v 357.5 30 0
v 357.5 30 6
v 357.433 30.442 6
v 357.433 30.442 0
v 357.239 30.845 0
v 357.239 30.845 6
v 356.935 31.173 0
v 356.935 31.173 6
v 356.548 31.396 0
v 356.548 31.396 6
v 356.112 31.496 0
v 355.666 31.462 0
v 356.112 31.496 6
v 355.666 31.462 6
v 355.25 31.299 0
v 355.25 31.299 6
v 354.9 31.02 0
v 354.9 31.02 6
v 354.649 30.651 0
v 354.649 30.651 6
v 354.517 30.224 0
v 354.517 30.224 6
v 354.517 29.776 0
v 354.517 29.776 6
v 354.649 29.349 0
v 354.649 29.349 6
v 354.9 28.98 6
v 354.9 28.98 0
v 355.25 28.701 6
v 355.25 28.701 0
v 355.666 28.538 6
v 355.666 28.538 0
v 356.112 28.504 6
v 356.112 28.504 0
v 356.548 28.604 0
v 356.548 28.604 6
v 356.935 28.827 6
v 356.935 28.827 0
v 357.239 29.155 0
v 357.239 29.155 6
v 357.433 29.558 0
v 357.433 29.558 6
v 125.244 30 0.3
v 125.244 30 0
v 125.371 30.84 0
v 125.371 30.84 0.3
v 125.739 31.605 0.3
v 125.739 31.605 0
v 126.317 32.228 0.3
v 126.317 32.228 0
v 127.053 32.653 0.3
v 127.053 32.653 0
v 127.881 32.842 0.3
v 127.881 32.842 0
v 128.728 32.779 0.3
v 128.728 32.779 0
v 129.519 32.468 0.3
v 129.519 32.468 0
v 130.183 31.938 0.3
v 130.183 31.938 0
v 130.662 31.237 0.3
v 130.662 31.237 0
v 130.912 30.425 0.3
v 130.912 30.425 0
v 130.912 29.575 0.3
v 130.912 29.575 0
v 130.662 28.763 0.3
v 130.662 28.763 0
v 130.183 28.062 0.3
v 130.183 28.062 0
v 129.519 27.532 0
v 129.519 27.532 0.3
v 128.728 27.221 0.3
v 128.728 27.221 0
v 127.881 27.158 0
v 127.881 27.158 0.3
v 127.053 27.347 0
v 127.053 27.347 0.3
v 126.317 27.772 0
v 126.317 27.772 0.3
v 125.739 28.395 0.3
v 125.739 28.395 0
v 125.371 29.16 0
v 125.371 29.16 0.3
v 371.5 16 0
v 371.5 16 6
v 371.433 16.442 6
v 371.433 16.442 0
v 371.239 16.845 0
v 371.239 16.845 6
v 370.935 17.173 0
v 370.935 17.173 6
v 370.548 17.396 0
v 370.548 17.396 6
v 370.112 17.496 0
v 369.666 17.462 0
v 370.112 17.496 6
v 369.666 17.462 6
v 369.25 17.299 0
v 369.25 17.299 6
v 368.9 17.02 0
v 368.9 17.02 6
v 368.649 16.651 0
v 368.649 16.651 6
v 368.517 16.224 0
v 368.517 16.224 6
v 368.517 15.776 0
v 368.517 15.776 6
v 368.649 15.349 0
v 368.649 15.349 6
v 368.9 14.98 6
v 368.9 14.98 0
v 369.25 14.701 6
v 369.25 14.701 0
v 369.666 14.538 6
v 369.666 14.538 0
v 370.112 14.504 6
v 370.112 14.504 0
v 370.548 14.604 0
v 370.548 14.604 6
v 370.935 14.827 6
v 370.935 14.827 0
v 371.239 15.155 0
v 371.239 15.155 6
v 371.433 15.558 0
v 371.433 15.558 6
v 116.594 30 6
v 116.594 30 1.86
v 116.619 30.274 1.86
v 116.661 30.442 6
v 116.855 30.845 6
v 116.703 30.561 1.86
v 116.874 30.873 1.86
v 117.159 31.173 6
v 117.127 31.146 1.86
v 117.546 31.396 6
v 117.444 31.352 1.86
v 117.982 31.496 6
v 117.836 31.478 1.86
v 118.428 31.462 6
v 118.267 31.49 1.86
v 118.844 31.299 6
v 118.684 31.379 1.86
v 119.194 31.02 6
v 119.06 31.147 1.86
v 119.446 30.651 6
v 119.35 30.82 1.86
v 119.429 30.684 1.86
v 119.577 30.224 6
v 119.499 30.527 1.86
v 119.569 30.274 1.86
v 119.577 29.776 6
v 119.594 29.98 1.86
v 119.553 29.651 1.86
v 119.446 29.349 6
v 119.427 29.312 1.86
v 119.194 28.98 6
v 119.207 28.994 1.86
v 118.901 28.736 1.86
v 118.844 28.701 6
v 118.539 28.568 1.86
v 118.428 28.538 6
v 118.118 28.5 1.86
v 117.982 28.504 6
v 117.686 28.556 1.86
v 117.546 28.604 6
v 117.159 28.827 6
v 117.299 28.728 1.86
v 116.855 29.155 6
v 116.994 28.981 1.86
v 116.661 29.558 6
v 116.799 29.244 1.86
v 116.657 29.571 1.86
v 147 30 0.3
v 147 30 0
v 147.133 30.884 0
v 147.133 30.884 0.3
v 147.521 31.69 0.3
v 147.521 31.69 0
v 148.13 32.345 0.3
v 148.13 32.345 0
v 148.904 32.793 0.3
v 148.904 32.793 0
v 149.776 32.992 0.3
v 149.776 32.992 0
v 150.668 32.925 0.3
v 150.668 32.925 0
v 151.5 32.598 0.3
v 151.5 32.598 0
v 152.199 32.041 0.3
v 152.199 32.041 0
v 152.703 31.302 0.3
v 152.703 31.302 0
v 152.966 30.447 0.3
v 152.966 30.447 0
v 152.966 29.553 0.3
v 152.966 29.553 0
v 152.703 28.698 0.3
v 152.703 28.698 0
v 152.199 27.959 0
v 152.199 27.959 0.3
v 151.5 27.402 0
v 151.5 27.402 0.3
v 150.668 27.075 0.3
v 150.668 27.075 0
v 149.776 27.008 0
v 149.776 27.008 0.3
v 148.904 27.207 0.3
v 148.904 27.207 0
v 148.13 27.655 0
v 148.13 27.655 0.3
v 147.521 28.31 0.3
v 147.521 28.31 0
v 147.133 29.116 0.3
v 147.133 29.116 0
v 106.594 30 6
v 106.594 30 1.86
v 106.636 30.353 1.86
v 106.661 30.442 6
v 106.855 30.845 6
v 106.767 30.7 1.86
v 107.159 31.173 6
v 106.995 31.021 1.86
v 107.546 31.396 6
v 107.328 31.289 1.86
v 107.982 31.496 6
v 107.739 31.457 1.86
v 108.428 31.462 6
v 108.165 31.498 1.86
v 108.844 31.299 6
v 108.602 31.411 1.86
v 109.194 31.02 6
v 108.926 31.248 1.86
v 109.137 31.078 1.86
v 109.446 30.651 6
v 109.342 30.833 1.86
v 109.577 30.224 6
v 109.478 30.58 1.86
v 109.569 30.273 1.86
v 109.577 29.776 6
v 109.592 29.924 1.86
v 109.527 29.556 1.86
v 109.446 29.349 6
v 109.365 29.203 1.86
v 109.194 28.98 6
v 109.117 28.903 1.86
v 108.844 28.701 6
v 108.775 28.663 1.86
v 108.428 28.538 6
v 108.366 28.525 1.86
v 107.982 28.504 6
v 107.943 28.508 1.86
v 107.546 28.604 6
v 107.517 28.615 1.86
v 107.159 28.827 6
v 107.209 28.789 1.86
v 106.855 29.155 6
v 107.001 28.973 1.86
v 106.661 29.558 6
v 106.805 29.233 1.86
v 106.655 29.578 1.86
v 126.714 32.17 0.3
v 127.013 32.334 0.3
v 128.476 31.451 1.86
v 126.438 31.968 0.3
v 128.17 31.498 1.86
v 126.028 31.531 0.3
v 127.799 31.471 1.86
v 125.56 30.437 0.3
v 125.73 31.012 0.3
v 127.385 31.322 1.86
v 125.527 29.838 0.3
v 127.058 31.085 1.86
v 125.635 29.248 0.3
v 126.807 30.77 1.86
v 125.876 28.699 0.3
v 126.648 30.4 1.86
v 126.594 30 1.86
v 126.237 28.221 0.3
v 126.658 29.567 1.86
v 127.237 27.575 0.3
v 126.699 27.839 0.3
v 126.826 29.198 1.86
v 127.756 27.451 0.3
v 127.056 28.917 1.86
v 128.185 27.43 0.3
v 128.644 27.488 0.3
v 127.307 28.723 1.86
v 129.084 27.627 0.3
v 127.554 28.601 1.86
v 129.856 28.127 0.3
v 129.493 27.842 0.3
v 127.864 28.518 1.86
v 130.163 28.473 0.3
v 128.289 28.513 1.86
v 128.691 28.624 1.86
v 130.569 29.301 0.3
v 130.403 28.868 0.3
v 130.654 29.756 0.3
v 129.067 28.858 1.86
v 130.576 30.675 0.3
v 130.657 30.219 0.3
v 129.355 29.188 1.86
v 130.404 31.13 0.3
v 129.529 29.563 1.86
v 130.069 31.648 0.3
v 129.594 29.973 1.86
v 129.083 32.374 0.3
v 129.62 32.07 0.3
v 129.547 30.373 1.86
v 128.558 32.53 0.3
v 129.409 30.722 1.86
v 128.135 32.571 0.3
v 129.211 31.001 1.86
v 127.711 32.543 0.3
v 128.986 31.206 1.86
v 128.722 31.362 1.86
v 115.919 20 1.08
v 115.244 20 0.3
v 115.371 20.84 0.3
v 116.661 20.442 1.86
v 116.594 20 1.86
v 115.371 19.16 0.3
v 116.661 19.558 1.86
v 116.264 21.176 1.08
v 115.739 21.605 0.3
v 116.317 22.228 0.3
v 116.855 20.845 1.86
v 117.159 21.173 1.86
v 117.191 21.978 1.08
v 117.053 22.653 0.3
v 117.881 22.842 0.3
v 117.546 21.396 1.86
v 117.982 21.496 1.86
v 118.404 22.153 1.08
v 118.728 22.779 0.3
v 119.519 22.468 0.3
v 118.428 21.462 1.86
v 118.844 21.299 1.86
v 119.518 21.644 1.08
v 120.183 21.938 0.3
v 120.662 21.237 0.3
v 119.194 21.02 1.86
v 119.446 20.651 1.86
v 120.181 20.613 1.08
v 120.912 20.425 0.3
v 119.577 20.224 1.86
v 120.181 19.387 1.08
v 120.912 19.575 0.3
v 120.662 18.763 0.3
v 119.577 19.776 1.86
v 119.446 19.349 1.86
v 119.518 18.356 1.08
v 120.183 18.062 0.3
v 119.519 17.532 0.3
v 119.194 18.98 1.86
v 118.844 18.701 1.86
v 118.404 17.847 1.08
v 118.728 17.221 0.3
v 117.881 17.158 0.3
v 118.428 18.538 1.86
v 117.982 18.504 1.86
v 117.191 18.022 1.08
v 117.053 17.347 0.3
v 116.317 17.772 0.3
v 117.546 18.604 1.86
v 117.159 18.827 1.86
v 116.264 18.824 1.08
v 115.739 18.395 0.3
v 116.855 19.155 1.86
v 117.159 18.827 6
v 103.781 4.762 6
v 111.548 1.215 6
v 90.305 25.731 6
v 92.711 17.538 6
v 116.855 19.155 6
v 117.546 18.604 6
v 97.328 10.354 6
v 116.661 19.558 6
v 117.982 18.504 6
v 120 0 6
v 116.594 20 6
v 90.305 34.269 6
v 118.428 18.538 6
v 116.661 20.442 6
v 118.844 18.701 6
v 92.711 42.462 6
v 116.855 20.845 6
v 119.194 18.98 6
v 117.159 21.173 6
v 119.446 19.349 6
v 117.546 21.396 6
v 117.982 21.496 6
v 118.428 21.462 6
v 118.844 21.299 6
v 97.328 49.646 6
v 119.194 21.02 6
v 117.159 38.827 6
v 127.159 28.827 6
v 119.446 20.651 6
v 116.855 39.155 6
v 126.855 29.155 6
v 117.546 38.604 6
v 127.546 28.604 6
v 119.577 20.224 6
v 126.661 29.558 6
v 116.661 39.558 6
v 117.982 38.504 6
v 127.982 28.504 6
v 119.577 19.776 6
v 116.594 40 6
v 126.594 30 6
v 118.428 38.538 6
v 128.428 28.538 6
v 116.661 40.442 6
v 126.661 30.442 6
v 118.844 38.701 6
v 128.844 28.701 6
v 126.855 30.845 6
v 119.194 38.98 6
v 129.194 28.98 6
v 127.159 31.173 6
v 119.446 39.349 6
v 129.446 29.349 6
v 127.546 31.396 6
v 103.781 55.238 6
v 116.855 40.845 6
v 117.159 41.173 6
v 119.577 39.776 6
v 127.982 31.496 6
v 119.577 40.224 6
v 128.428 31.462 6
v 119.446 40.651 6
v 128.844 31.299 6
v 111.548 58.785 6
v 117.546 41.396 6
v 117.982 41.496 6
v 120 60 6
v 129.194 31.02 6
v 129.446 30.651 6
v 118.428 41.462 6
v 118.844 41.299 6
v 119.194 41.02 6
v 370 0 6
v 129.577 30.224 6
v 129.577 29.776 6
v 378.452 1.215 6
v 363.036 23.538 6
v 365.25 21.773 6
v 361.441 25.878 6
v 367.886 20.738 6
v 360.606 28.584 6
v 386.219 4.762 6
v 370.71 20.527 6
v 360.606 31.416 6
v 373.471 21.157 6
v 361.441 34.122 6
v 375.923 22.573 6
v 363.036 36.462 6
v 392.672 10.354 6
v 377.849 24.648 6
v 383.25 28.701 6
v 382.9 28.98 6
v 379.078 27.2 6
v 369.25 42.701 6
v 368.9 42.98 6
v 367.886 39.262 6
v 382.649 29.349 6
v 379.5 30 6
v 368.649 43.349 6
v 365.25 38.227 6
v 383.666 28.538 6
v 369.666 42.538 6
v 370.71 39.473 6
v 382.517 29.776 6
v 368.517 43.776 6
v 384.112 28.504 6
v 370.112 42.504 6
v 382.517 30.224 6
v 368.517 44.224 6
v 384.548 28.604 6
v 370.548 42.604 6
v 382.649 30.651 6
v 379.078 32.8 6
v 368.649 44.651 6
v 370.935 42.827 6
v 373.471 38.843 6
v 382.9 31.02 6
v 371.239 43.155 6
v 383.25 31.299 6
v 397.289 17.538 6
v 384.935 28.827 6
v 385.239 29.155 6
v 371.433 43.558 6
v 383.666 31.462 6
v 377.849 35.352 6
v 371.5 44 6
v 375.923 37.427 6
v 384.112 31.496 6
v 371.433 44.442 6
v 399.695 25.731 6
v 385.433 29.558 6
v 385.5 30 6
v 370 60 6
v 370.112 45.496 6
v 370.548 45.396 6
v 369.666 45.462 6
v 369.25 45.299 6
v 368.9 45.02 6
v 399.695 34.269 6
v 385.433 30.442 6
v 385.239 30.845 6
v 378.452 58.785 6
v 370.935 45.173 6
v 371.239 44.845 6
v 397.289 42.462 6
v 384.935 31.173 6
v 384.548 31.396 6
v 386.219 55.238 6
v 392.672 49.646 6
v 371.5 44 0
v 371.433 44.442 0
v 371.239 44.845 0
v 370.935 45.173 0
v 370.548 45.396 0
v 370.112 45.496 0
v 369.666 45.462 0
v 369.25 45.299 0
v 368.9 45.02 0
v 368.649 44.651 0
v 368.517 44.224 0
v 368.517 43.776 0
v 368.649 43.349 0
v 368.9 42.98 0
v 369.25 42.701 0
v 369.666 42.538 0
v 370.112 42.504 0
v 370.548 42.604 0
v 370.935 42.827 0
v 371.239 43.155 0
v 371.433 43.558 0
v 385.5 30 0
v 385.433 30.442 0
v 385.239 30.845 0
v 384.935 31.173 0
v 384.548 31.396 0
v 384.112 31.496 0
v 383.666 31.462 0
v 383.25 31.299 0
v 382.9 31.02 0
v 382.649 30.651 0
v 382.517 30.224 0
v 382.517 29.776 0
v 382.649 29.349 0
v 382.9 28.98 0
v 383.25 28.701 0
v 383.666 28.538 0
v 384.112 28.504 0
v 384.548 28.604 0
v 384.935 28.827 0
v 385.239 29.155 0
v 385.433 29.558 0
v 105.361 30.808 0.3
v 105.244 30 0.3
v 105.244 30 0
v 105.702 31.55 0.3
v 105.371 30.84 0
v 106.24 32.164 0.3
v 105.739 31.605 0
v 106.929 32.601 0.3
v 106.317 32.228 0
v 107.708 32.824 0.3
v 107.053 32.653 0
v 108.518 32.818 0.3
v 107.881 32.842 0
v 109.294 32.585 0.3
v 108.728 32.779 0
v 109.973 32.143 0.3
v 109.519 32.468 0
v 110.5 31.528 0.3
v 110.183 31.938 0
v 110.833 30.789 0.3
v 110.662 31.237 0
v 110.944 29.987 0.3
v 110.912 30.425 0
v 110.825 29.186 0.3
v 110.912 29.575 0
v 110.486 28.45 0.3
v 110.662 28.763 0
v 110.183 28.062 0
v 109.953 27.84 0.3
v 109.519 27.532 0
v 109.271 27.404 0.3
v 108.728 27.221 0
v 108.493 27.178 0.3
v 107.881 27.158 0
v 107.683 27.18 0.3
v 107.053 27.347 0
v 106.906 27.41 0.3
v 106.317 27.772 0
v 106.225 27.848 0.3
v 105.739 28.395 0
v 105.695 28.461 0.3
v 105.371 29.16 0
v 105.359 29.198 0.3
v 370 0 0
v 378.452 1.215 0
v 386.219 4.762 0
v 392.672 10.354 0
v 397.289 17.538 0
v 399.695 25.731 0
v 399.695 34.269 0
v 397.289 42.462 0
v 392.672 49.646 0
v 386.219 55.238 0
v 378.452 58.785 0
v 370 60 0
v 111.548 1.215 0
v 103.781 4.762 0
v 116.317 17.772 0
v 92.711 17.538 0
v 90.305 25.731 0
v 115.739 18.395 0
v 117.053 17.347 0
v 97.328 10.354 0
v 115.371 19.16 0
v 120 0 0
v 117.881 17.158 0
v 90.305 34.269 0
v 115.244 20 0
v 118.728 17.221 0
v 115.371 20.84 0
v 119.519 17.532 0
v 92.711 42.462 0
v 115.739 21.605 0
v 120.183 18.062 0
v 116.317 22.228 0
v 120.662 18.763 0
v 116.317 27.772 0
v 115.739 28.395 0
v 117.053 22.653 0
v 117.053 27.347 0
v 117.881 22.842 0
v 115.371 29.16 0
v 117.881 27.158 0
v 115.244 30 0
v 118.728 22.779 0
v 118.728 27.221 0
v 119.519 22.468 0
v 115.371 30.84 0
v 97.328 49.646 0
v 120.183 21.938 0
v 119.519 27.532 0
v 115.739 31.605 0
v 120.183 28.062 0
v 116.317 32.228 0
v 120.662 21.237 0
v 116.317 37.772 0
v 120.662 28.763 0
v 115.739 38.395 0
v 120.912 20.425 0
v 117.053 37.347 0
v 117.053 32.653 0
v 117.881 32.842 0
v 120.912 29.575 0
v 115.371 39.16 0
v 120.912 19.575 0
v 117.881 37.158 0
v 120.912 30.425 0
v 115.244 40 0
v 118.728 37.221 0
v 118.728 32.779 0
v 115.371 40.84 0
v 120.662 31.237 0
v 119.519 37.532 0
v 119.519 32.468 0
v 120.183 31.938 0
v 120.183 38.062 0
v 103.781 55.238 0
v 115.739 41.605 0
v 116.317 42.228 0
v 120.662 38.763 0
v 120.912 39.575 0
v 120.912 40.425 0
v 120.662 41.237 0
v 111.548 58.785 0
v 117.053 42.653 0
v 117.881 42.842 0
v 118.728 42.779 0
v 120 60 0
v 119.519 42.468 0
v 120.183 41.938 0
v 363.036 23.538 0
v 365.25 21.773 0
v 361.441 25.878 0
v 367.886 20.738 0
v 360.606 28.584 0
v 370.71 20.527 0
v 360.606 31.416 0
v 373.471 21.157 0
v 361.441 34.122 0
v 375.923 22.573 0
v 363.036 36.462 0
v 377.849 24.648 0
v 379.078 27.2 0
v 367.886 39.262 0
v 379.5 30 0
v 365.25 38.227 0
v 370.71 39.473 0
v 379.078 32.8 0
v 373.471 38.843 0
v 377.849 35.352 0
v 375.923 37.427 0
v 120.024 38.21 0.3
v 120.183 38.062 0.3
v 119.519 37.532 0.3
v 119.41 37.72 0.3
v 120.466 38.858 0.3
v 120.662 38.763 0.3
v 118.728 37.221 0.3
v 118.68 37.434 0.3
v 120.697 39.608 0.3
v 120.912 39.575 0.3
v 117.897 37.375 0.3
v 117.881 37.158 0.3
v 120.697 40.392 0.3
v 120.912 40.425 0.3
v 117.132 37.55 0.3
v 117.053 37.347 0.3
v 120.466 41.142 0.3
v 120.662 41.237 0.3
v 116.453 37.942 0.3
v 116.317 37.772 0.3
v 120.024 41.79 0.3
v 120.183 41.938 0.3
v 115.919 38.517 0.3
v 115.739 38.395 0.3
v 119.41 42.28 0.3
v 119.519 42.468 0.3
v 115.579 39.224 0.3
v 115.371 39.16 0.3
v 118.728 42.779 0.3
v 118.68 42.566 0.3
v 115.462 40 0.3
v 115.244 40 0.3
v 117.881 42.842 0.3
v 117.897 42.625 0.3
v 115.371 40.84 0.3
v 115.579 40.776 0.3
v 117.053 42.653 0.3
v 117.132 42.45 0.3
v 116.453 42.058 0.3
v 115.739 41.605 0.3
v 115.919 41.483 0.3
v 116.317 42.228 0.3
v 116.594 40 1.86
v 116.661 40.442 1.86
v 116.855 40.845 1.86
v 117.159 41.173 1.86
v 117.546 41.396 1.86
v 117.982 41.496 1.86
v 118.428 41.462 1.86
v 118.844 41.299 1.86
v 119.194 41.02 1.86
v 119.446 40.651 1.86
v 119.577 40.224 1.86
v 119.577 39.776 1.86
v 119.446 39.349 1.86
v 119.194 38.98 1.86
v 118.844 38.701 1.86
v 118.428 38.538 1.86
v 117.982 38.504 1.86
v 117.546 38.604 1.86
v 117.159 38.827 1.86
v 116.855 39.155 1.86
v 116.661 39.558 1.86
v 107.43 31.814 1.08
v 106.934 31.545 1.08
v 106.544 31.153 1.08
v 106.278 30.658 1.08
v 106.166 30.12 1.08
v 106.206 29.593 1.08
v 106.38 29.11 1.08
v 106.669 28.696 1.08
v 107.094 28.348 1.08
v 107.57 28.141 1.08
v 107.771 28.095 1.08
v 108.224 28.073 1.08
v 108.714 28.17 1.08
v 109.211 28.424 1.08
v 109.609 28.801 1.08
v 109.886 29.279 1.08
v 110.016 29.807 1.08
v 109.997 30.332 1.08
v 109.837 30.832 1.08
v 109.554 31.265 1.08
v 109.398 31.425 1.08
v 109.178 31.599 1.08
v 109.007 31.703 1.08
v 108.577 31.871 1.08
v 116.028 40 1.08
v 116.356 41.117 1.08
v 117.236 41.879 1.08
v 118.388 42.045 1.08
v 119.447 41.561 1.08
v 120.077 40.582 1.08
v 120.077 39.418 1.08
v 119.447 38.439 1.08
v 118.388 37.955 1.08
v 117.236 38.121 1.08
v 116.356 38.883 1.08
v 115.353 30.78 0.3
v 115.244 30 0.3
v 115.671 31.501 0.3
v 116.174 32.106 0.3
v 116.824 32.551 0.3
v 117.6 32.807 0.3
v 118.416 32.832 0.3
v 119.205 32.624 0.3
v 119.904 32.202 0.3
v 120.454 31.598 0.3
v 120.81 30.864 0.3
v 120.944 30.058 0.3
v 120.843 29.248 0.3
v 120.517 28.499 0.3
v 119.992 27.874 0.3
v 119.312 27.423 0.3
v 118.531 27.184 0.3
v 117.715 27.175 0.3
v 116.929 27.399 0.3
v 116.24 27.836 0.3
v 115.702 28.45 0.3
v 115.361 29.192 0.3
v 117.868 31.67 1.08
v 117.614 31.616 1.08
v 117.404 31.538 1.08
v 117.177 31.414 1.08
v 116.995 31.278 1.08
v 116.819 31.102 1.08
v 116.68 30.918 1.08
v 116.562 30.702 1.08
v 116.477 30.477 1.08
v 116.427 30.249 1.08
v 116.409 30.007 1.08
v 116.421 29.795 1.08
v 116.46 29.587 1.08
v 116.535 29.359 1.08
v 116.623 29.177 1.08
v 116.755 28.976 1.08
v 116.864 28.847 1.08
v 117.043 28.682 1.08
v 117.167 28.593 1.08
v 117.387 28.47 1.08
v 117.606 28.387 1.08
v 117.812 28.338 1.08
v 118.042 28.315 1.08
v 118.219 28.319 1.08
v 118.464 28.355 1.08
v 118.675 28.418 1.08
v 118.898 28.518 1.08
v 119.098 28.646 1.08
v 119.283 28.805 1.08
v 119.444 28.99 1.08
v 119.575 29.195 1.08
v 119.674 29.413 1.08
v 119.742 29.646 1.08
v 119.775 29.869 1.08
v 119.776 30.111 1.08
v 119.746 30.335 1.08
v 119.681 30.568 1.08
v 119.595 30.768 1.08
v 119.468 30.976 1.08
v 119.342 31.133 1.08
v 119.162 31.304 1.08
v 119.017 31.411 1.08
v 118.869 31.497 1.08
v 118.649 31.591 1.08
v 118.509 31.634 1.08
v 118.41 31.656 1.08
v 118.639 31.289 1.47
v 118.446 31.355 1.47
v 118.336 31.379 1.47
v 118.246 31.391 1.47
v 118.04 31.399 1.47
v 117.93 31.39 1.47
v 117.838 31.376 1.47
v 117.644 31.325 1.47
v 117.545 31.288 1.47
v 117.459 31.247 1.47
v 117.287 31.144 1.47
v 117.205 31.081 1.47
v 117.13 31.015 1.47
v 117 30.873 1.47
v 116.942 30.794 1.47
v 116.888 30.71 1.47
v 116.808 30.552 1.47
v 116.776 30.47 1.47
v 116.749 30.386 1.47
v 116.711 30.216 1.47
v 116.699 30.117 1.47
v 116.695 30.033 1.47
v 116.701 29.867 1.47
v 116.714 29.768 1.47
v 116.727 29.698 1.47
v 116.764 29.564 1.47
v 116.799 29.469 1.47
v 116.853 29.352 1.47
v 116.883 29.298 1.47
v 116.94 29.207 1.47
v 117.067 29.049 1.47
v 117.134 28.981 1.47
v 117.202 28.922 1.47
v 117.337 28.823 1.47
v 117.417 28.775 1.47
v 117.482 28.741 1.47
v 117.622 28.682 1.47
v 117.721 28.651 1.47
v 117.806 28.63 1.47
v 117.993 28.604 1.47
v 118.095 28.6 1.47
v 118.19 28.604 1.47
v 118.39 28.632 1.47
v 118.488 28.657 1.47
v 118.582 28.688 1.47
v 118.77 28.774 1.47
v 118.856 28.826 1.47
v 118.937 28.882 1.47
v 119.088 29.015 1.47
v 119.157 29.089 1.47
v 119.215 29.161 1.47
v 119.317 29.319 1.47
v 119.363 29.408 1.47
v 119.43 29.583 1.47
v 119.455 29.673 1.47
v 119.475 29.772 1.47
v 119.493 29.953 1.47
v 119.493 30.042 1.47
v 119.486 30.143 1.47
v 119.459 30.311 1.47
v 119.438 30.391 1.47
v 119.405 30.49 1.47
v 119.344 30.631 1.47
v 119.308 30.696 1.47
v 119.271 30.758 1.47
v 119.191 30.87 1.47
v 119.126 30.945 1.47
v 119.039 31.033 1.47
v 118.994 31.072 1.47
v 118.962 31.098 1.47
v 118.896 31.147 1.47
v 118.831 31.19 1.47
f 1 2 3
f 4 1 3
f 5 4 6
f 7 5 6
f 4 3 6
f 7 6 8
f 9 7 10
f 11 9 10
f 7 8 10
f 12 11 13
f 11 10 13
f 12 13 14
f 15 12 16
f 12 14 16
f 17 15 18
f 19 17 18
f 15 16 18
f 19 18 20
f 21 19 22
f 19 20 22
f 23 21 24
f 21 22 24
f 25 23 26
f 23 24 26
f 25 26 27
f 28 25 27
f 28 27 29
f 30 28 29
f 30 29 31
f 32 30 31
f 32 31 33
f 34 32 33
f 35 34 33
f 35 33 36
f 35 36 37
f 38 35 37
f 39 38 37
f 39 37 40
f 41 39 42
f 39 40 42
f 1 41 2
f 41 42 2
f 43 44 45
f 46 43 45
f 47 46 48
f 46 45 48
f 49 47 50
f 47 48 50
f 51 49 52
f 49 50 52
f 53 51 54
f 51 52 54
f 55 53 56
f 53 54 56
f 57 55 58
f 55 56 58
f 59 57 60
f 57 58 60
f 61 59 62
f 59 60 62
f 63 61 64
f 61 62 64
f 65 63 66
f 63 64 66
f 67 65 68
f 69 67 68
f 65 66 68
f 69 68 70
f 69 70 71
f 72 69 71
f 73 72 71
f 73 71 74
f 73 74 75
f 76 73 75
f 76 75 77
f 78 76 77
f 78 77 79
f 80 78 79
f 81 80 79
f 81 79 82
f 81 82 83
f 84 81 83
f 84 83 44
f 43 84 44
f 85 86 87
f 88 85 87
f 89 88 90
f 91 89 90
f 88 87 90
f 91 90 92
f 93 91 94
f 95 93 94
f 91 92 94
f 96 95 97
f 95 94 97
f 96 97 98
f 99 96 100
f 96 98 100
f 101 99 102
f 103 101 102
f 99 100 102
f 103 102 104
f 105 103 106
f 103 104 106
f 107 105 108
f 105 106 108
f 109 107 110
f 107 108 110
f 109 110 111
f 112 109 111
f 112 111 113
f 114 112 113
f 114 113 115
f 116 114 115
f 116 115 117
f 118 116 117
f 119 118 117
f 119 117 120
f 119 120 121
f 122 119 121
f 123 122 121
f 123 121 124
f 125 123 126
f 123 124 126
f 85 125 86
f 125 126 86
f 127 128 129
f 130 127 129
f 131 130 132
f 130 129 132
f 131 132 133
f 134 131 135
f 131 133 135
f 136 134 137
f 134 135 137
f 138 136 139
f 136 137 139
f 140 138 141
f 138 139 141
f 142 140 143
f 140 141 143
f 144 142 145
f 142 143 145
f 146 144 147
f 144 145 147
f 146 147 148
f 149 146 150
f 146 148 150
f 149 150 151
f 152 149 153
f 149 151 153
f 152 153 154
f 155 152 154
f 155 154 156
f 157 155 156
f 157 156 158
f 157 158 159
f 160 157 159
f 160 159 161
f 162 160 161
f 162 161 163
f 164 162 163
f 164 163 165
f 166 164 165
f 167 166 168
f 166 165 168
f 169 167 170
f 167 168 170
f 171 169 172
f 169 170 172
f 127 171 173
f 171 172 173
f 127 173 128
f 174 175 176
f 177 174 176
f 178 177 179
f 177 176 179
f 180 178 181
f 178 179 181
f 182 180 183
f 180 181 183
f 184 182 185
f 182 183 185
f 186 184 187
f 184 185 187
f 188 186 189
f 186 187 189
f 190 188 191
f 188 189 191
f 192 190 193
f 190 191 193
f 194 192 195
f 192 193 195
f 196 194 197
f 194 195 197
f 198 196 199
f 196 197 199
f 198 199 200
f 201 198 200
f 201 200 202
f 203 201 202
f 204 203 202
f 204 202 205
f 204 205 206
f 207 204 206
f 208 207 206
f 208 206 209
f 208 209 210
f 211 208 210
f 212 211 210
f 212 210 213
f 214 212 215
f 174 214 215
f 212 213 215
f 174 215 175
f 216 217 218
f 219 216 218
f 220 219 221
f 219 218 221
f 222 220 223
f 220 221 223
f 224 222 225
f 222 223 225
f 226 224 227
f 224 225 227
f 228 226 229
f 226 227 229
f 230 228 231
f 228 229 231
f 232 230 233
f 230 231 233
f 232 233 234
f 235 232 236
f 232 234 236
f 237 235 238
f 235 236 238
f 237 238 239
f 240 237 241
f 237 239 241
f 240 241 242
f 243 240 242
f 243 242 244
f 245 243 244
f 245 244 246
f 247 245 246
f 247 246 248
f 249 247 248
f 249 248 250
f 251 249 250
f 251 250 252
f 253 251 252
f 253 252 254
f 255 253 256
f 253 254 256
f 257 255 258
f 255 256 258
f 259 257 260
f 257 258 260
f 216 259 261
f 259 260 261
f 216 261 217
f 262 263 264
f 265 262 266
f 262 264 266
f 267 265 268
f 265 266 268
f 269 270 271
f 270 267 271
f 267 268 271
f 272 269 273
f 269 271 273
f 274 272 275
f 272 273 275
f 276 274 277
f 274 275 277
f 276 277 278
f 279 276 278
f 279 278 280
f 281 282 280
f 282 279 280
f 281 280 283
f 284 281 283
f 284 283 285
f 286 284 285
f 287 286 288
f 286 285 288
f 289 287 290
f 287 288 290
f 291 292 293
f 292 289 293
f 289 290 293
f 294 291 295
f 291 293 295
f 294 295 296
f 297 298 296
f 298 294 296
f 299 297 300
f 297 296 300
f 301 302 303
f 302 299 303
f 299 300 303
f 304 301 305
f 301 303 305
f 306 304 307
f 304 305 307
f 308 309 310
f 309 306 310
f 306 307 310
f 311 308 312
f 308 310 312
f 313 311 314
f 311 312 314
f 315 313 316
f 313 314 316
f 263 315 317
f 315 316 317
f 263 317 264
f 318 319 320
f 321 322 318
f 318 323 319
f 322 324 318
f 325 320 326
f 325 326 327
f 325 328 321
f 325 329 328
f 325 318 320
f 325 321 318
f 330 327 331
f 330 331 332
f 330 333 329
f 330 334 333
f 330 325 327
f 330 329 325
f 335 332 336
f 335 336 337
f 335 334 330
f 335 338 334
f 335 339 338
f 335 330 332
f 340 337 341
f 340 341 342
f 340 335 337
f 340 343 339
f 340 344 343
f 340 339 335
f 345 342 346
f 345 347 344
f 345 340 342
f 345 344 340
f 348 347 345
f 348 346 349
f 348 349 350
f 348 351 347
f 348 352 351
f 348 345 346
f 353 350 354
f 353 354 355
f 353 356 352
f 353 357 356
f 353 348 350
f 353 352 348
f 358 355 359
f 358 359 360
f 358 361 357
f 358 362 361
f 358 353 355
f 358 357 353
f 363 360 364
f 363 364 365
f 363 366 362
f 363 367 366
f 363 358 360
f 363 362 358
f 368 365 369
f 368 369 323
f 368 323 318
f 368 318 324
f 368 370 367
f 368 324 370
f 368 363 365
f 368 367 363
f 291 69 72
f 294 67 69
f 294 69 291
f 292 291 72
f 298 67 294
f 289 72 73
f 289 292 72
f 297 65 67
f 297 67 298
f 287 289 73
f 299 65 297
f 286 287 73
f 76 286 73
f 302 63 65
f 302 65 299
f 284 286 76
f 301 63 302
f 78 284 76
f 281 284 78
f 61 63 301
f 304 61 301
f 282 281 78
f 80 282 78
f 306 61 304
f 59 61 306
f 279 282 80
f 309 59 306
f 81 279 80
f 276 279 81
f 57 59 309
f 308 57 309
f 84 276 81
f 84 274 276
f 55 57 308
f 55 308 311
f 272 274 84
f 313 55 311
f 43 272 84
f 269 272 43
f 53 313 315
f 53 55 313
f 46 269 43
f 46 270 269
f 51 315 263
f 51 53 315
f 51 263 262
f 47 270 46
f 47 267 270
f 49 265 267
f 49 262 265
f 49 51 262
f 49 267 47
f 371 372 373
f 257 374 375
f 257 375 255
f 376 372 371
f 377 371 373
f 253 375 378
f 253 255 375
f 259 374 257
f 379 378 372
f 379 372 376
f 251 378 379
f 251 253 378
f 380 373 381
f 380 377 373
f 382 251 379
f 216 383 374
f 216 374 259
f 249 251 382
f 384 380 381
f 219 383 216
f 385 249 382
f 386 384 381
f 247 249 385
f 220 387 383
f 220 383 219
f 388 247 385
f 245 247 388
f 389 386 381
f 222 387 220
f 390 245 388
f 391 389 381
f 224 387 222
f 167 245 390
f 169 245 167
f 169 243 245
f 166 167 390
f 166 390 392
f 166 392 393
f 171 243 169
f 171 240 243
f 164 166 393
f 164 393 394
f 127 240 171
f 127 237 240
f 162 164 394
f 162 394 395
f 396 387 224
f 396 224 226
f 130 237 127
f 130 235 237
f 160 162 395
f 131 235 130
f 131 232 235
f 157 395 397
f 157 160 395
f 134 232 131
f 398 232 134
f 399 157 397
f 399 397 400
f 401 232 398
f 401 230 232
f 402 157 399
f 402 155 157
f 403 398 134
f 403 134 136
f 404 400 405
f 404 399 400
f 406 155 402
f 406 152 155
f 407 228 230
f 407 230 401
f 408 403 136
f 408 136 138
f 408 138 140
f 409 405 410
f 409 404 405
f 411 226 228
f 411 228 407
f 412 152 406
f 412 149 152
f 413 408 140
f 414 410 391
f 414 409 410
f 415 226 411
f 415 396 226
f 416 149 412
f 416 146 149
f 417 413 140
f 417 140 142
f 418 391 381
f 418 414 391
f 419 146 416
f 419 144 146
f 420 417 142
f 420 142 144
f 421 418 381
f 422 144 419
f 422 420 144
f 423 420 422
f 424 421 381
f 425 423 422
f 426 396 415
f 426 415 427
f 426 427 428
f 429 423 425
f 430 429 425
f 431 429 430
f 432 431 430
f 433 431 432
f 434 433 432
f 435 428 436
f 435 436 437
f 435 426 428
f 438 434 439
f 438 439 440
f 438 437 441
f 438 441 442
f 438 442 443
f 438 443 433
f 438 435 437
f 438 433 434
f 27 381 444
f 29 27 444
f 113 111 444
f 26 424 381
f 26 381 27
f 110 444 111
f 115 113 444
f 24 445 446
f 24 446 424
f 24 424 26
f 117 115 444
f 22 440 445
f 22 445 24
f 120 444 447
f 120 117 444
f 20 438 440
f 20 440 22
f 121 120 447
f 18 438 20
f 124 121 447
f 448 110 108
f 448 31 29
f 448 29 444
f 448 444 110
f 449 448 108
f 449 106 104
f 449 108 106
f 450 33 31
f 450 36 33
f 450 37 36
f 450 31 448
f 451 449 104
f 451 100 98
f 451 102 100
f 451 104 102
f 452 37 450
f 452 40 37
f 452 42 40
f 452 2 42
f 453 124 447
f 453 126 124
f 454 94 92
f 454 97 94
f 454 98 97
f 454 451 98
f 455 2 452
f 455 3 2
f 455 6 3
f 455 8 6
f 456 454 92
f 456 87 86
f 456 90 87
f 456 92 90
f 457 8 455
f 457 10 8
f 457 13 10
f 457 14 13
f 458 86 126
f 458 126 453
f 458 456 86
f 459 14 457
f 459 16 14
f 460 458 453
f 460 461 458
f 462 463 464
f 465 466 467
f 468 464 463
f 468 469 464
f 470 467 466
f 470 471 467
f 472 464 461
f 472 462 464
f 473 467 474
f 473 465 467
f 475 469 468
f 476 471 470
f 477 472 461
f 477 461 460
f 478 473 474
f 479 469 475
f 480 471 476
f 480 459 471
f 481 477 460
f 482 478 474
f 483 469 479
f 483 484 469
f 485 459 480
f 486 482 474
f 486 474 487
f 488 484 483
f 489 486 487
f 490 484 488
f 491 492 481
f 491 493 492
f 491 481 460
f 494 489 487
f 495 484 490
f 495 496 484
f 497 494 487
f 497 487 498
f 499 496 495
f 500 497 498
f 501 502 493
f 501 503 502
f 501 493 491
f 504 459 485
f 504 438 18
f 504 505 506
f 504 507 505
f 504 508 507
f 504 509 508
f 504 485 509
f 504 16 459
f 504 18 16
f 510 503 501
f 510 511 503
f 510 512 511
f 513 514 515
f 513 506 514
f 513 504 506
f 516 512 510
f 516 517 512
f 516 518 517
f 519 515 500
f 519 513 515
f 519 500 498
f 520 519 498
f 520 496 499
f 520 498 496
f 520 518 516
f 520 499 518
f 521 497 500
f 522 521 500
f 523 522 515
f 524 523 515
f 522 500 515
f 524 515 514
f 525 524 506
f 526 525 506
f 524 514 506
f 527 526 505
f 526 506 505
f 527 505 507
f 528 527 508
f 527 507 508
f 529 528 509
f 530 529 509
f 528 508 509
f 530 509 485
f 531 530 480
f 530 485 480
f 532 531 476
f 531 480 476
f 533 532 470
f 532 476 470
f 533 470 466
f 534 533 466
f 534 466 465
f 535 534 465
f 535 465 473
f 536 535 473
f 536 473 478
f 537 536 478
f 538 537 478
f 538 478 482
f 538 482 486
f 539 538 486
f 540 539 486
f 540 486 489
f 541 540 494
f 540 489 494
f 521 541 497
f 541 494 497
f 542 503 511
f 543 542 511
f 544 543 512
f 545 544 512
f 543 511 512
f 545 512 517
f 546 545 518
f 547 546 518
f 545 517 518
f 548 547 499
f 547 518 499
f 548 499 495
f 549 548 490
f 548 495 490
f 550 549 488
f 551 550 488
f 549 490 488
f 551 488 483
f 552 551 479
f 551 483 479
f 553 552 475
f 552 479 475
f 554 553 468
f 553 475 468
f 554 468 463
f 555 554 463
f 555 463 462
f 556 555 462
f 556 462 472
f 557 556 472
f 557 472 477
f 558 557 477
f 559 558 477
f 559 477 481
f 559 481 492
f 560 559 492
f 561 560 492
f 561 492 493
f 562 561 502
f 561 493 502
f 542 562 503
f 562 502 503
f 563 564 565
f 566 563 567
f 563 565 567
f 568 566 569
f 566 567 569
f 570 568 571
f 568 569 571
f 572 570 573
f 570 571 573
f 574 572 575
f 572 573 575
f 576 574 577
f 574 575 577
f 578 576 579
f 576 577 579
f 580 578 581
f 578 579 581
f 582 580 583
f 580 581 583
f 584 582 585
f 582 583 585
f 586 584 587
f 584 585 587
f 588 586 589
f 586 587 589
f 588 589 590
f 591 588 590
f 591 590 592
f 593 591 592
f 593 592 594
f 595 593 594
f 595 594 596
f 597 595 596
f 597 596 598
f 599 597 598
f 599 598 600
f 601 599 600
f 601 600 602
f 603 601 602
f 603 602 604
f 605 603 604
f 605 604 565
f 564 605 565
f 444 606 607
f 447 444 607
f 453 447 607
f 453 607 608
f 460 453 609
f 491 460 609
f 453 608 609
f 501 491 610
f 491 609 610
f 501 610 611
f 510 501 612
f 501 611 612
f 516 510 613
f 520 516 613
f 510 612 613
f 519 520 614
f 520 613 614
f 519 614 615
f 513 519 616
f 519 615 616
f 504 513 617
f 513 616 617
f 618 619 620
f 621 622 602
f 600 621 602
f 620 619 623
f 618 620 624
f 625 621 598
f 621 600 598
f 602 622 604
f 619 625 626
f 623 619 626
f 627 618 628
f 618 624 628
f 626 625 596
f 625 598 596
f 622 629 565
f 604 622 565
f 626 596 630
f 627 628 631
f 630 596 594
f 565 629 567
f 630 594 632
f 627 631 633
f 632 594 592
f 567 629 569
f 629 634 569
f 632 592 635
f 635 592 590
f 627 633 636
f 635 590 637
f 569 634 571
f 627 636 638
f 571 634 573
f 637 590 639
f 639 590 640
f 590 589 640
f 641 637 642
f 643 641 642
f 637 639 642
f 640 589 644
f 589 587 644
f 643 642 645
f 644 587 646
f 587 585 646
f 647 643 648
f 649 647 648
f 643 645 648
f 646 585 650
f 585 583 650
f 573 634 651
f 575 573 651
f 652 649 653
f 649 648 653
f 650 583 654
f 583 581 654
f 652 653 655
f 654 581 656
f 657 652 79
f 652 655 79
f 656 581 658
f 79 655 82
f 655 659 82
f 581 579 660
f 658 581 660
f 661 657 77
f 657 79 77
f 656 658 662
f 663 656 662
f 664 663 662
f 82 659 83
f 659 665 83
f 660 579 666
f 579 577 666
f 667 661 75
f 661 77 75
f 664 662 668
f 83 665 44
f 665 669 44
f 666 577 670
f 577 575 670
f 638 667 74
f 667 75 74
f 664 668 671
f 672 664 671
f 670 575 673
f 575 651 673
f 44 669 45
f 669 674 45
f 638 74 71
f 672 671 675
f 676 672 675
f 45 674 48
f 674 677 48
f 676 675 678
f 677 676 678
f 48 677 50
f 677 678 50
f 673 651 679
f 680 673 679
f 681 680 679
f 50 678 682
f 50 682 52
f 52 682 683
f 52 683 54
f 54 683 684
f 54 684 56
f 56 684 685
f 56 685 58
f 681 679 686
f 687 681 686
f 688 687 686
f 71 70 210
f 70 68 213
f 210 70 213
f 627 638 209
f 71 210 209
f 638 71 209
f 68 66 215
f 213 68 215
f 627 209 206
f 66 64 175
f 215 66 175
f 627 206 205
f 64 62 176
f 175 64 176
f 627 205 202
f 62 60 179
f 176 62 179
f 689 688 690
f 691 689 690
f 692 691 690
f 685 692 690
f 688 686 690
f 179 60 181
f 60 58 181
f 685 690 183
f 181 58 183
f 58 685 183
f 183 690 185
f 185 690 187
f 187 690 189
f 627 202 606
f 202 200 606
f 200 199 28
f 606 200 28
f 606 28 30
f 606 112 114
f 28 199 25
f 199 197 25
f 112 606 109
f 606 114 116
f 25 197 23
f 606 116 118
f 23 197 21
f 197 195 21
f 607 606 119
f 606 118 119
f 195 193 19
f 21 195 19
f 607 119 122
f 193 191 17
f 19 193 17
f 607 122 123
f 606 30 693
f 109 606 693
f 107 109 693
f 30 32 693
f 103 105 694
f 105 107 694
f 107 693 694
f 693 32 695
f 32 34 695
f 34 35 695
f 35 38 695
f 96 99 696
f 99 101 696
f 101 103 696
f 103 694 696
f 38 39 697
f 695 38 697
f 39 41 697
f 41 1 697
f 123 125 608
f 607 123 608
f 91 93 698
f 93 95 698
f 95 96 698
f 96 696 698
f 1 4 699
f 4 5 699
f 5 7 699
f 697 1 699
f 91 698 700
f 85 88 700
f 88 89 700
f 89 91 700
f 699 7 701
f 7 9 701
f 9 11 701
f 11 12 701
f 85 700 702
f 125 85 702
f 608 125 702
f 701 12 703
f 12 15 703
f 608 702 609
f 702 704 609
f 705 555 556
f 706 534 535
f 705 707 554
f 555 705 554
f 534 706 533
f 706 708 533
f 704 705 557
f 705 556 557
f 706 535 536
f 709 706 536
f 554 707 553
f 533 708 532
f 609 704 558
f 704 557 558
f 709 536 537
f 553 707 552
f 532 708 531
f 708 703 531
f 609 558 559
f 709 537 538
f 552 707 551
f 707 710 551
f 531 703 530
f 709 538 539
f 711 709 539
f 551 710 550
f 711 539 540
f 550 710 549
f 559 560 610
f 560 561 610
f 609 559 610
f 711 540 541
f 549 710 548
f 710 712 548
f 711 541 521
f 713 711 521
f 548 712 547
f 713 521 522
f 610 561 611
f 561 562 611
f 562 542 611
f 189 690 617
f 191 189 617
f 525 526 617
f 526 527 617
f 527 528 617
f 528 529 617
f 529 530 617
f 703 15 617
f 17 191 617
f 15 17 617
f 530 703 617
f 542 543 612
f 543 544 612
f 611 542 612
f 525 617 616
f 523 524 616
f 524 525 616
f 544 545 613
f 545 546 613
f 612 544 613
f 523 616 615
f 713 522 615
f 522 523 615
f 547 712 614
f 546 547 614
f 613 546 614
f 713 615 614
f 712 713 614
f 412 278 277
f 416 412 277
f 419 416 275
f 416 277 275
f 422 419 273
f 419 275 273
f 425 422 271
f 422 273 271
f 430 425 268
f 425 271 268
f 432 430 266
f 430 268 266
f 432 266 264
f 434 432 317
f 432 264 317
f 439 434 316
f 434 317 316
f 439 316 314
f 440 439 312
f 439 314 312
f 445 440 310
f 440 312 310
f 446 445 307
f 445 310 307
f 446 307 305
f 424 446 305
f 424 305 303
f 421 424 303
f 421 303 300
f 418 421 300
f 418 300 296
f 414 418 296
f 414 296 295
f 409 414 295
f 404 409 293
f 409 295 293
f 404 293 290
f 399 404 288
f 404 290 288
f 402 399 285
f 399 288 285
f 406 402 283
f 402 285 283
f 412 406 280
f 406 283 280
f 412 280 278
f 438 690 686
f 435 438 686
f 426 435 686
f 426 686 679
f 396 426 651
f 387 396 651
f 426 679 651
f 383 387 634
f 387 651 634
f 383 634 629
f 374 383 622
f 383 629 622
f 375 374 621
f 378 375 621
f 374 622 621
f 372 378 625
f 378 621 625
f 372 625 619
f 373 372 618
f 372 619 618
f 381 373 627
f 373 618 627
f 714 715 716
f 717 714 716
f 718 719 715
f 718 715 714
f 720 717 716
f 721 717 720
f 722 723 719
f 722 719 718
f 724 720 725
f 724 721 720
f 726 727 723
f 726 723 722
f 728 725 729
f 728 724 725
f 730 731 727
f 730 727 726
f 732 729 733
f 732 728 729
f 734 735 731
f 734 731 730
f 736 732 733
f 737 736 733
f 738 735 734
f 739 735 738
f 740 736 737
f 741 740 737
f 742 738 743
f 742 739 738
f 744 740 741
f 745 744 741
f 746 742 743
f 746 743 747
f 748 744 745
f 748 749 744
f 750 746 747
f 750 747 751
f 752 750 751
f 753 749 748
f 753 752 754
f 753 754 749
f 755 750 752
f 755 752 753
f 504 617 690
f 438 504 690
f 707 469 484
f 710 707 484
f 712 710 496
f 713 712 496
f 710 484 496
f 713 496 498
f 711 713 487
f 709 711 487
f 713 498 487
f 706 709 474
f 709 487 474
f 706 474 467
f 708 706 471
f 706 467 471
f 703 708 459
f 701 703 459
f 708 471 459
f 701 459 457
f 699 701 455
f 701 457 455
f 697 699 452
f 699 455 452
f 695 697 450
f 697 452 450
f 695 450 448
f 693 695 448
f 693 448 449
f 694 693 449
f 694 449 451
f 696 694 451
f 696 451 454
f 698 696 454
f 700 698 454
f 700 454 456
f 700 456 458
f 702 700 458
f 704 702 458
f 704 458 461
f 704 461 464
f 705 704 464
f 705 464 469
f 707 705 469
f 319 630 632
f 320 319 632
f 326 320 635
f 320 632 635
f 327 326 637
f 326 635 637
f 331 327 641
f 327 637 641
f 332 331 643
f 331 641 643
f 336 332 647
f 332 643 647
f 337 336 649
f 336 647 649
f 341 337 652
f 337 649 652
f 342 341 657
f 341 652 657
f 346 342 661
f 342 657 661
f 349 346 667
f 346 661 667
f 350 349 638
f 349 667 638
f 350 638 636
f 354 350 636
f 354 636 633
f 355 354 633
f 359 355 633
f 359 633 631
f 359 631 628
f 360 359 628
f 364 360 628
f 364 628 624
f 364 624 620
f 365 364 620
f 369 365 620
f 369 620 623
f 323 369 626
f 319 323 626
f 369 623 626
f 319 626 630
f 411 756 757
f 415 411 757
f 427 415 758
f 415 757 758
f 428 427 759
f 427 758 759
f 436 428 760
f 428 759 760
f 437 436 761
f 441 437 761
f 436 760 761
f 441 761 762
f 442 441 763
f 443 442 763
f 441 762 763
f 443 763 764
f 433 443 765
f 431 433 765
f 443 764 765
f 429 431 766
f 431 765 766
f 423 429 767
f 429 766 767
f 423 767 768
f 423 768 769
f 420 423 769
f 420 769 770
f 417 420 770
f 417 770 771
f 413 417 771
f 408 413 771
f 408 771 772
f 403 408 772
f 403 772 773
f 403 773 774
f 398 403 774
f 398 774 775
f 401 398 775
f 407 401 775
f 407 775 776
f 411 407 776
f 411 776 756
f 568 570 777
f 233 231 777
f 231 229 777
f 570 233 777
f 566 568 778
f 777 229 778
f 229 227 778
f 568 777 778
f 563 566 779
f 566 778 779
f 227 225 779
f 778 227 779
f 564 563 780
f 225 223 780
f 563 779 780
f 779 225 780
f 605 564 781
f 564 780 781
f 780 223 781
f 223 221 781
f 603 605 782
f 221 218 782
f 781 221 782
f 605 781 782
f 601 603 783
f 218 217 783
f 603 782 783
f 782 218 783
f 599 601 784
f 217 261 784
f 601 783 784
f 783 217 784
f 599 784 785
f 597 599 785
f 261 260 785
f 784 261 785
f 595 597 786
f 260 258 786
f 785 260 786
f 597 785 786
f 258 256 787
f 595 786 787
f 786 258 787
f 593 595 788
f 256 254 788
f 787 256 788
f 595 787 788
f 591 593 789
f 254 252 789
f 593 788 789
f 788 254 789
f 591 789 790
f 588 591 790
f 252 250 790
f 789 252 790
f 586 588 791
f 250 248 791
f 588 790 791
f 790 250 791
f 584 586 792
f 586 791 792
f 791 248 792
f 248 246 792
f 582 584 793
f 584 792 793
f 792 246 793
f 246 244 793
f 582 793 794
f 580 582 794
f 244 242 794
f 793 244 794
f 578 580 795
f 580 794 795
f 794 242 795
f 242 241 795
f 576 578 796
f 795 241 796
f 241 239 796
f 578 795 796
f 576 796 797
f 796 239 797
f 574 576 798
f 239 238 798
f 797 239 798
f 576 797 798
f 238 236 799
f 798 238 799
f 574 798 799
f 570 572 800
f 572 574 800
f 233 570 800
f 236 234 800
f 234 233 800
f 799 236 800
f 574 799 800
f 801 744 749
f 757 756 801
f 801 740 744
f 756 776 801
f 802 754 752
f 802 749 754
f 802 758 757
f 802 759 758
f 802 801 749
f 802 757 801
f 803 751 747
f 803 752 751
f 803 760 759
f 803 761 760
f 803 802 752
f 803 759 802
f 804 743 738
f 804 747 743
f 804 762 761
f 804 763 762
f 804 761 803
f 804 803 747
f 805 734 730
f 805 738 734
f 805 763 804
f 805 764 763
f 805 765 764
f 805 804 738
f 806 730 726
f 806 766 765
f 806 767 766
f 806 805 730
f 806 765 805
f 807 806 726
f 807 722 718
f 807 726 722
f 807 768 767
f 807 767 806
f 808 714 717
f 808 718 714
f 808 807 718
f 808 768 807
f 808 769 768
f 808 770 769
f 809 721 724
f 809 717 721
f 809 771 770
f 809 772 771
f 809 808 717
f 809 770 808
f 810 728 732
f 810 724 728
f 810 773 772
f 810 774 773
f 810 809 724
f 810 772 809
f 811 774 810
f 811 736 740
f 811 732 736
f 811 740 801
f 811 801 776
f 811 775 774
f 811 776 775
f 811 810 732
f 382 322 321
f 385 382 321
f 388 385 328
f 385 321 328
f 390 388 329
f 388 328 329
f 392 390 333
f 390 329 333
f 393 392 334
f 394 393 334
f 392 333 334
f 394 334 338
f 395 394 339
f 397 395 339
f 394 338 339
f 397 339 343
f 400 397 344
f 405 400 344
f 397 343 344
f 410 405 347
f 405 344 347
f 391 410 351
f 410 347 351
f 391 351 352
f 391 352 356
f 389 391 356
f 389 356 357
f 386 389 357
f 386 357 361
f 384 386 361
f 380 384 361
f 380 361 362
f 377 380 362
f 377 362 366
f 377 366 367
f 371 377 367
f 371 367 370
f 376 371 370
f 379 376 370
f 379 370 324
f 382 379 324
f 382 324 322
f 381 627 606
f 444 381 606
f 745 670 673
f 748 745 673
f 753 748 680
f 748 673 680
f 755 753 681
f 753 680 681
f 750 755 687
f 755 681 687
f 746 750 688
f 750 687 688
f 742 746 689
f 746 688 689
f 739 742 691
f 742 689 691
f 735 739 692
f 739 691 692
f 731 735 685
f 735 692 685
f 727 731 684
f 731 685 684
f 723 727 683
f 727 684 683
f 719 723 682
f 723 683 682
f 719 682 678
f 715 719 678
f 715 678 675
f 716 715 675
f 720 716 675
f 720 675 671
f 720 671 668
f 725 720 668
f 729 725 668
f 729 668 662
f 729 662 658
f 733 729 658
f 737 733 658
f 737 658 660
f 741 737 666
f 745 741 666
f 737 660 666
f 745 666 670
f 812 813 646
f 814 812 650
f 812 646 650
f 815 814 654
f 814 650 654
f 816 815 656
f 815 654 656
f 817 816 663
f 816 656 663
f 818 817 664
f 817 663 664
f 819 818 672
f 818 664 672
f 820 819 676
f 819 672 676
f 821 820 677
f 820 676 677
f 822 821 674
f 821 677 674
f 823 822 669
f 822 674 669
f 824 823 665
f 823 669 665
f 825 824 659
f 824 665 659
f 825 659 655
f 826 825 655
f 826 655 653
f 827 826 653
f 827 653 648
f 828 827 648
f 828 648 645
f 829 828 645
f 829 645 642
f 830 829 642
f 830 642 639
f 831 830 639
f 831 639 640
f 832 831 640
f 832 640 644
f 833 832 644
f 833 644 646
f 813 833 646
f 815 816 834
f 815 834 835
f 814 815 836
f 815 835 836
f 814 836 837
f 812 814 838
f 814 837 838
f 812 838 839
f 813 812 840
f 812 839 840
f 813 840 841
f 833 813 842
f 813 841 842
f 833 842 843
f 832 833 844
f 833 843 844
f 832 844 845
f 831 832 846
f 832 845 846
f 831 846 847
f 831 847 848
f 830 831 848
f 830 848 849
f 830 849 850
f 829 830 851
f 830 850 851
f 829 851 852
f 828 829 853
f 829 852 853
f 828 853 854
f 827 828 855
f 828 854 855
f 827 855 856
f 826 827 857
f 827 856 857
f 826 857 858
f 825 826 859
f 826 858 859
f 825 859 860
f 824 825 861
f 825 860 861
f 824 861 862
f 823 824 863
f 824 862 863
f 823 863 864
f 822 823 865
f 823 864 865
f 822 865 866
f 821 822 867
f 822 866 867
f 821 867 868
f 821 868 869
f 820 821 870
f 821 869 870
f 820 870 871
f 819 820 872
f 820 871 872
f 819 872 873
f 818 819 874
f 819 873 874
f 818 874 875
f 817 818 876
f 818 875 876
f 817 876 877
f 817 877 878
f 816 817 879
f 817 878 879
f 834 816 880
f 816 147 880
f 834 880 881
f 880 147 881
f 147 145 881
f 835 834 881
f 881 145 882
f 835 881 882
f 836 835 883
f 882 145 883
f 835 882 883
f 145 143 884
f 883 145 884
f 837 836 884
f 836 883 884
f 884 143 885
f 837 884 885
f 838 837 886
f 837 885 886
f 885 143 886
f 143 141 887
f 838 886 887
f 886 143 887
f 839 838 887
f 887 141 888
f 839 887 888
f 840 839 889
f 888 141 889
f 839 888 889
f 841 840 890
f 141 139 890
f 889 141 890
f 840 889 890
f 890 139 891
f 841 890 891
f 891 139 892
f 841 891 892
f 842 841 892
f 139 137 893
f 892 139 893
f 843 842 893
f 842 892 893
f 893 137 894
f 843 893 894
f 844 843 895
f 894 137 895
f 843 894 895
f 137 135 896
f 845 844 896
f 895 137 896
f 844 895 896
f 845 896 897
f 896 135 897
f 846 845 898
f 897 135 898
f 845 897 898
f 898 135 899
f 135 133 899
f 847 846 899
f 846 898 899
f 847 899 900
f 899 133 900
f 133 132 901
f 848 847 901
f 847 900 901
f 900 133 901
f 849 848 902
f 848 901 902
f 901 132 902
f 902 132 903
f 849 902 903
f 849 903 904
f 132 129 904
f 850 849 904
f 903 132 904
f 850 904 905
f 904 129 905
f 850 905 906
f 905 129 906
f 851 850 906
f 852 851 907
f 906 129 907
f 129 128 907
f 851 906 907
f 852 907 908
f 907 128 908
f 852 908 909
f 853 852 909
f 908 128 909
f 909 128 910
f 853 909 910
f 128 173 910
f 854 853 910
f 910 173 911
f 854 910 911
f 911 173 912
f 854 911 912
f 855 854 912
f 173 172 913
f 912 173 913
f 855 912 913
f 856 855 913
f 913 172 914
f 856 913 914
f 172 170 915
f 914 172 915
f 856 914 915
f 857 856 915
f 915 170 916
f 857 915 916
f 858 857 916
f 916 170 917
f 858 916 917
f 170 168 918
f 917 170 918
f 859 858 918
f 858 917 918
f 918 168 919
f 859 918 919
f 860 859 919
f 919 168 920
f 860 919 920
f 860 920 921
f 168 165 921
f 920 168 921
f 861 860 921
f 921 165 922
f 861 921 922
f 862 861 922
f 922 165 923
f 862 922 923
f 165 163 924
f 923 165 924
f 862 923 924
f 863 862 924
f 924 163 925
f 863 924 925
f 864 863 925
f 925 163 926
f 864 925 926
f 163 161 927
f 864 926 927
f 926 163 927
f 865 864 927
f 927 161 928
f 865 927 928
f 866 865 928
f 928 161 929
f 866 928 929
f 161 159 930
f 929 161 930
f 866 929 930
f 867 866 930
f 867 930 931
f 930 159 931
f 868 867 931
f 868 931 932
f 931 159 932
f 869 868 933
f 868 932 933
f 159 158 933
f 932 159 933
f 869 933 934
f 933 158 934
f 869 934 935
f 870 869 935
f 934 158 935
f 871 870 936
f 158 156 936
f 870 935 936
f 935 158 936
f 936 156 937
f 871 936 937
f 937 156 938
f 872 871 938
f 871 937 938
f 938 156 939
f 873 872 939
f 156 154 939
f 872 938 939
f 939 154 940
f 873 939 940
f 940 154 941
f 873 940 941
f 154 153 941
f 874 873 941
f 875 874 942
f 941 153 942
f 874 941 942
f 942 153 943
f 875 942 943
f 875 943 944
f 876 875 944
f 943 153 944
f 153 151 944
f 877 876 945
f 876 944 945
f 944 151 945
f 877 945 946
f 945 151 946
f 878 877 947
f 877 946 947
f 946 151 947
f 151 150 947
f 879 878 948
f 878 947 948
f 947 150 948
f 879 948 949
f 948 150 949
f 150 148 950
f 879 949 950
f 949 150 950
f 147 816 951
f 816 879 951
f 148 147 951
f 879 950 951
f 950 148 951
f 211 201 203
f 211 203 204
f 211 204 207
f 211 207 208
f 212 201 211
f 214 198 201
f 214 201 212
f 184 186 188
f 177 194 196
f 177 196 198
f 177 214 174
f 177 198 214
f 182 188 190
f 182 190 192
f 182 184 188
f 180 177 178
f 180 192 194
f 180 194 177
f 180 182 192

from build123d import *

# Parameters (mm, degrees)
SALIENTE_EXTRUIR1_DEPTH = 6
CROQUIS2_R              = 9.5
CORTAR_EXTRUIR4_DEPTH   = 220
CROQUIS7_R              = 1.5
CORTAR_EXTRUIR5_DEPTH   = 6
CROQUIS8_R              = 3
CROQUIS8_R_2            = 2.85
CORTAR_EXTRUIR6_DEPTH   = 0.3
CROQUIS9_4_R            = 1.5
CROQUIS9_6_R            = 1.5
CROQUIS9_7_R            = 1.5
CORTAR_EXTRUIR7_DEPTH   = 405.496155235


with BuildPart() as part:
    # Croquis1 → Saliente-Extruir1 (new body)
    with BuildSketch(Plane.XY):
        with BuildLine():
            Line((120, 0), (370, 0))
            ThreePointArc((370, 0), (400, 30), (370, 60))
            Line((370, 60), (120, 60))
            ThreePointArc((120, 60), (90, 30), (120, 0))
        make_face()
    extrude(amount=SALIENTE_EXTRUIR1_DEPTH)

    # Croquis2 → Cortar-Extruir4 (cut)
    with BuildSketch(Plane.XY.offset(6)):
        with Locations((370, 30)):
            Circle(CROQUIS2_R)
    extrude(amount=-CORTAR_EXTRUIR4_DEPTH, mode=Mode.SUBTRACT)

    # Croquis7 → Cortar-Extruir5 (cut)
    with BuildSketch(Plane.XY.offset(6)):
        with Locations((370, 16)):
            Circle(CROQUIS7_R)
        with Locations((384, 30)):
            Circle(CROQUIS7_R)
        with Locations((356, 30)):
            Circle(CROQUIS7_R)
        with Locations((370, 44)):
            Circle(CROQUIS7_R)
    extrude(amount=-CORTAR_EXTRUIR5_DEPTH, mode=Mode.SUBTRACT)

    # Croquis8 → Cortar-Extruir6 (cut)
    with BuildSketch(Plane(origin=(0, 0, 0), x_dir=(-1, 0, 0), z_dir=(0, 0, -1))):
        with Locations((-150, 30)):
            Circle(CROQUIS8_R)
        with Locations((-128.0941, 30)):
            Circle(CROQUIS8_R_2)
        with Locations((-118.0941, 30)):
            Circle(CROQUIS8_R_2)
        with Locations((-108.0941, 30)):
            Circle(CROQUIS8_R_2)
        with Locations((-118.0941, 40)):
            Circle(CROQUIS8_R_2)
        with Locations((-118.0941, 20)):
            Circle(CROQUIS8_R_2)
    extrude(amount=-CORTAR_EXTRUIR6_DEPTH, mode=Mode.SUBTRACT)

    # Cortar-Recubrir1: read off the stored shape, not the designer's step
    # Cortar-Recubrir1: loft between two sections, ruled curve by curve
    cortar_recubrir1_from = [
        Edge.make_bspline([(126.732099738, 32.503488623, 0), (121.725122492, 29.779488099, 0), (124.449123016, 24.772510853, 0), (129.456100262, 27.496511377, 0), (134.463077508, 30.220511901, 0), (131.739076984, 35.227489147, 0), (126.732099738, 32.503488623, 0)], [0, 0, 0, 0, 0.5, 0.5, 0.5, 1, 1, 1, 1], 3, [1, 0.333333333, 0.333333333, 1, 0.333333333, 0.333333333, 1]),
    ]
    cortar_recubrir1_to = [
        Edge.make_bspline([(128.476256089, 31.450502232, 1.86), (125.575251625, 32.214814409, 1.86), (124.810939448, 29.313809945, 1.86), (127.711943911, 28.549497768, 1.86), (130.612948375, 27.785185591, 1.86), (131.377260552, 30.686190055, 1.86), (128.476256089, 31.450502232, 1.86)], [0, 0, 0, 0, 0.5, 0.5, 0.5, 1, 1, 1, 1], 3, [1, 0.333333333, 0.333333333, 1, 0.333333333, 0.333333333, 1]),
    ]
    cortar_recubrir1 = Solid(Shell([*[Face.make_surface_from_curves(cortar_recubrir1_from[k], cortar_recubrir1_to[k]) for k in range(1)], Face(Wire(cortar_recubrir1_from)), Face(Wire(cortar_recubrir1_to))]))
    add(cortar_recubrir1, mode=Mode.SUBTRACT)

    # Cortar-Recubrir2: read off the stored shape, not the designer's step
    # Cortar-Recubrir2: loft between two sections, ruled curve by curve
    cortar_recubrir2_from = [
        Edge.make_bspline([(116.824217171, 32.551450098, 0.3), (111.721316976, 30.01168444, 0.3), (114.261082633, 24.908784245, 0.3), (119.363982829, 27.448549902, 0.3), (124.466883024, 29.98831556, 0.3), (121.927117367, 35.091215755, 0.3), (116.824217171, 32.551450098, 0.3)], [0, 0, 0, 0, 0.5, 0.5, 0.5, 1, 1, 1, 1], 3, [1, 0.333333333, 0.333333333, 1, 0.333333333, 0.333333333, 1]),
    ]
    cortar_recubrir2_to = [
        Edge.make_bspline([(119.35039206, 30.81959152, 1.86), (117.71120902, 33.33217564, 1.86), (115.1986249, 31.6929926, 1.86), (116.83780794, 29.18040848, 1.86), (118.47699098, 26.66782436, 1.86), (120.9895751, 28.3070074, 1.86), (119.35039206, 30.81959152, 1.86)], [0, 0, 0, 0, 0.5, 0.5, 0.5, 1, 1, 1, 1], 3, [1, 0.333333333, 0.333333333, 1, 0.333333333, 0.333333333, 1]),
    ]
    cortar_recubrir2 = Solid(Shell([*[Face.make_surface_from_curves(cortar_recubrir2_from[k], cortar_recubrir2_to[k]) for k in range(1)], Face(Wire(cortar_recubrir2_from)), Face(Wire(cortar_recubrir2_to))]))
    add(cortar_recubrir2, mode=Mode.SUBTRACT)

    # Croquis9<4> → section 1 of cortar_recubrir3
    with BuildSketch(Plane(origin=(0, 0, 1.86), x_dir=(-1, 0, 0), z_dir=(0, 0, -1)), mode=Mode.PRIVATE) as cortar_recubrir3_s1:
        with Locations((-118.0941, 40)):
            Circle(CROQUIS9_4_R)
    # loft up to a face of the part (cortar_recubrir3)
    loft([Face(Wire([part.edges().sort_by_distance((120.045059252, 42.077560588, 0))[0]])), cortar_recubrir3_s1.sketch], mode=Mode.SUBTRACT)

    # Cortar-Recubrir4: read off the stored shape, not the designer's step
    # Cortar-Recubrir4: loft between two sections, ruled curve by curve
    cortar_recubrir4_from = [
        Edge.make_bspline([(106.929450137, 32.601171024, 0.3), (101.727108089, 30.271871298, 0.3), (104.056407815, 25.06952925, 0.3), (109.258749863, 27.398828976, 0.3), (114.461091911, 29.728128702, 0.3), (112.131792185, 34.93047075, 0.3), (106.929450137, 32.601171024, 0.3)], [0, 0, 0, 0, 0.5, 0.5, 0.5, 1, 1, 1, 1], 3, [1, 0.333333333, 0.333333333, 1, 0.333333333, 0.333333333, 1]),
    ]
    cortar_recubrir4_to = [
        Edge.make_bspline([(108.926279517, 31.247989283, 1.86), (106.43030095, 32.912348318, 1.86), (104.765941916, 30.416369751, 1.86), (107.261920483, 28.752010717, 1.86), (109.75789905, 27.087651682, 1.86), (111.422258084, 29.583630249, 1.86), (108.926279517, 31.247989283, 1.86)], [0, 0, 0, 0, 0.5, 0.5, 0.5, 1, 1, 1, 1], 3, [1, 0.333333333, 0.333333333, 1, 0.333333333, 0.333333333, 1]),
    ]
    cortar_recubrir4 = Solid(Shell([*[Face.make_surface_from_curves(cortar_recubrir4_from[k], cortar_recubrir4_to[k]) for k in range(1)], Face(Wire(cortar_recubrir4_from)), Face(Wire(cortar_recubrir4_to))]))
    add(cortar_recubrir4, mode=Mode.SUBTRACT)

    # Croquis9<6> → section 1 of cortar_recubrir5
    with BuildSketch(Plane(origin=(0, 0, 1.86), x_dir=(-1, 0, 0), z_dir=(0, 0, -1)), mode=Mode.PRIVATE) as cortar_recubrir5_s1:
        with Locations((-118.0941, 20)):
            Circle(CROQUIS9_6_R)
    # loft up to a face of the part (cortar_recubrir5)
    loft([Face(Wire([part.edges().sort_by_distance((120.045059252, 22.077560588, 0.3))[0]])), cortar_recubrir5_s1.sketch], mode=Mode.SUBTRACT)

    # Croquis9<7> → Cortar-Extruir7 (cut, through all)
    with BuildSketch(Plane(origin=(0, 0, 1.86), x_dir=(-1, 0, 0), z_dir=(0, 0, -1))):
        with Locations((-118.0941, 20)):
            Circle(CROQUIS9_7_R)
        with Locations((-108.0941, 30)):
            Circle(CROQUIS9_7_R)
        with Locations((-118.0941, 30)):
            Circle(CROQUIS9_7_R)
        with Locations((-128.0941, 30)):
            Circle(CROQUIS9_7_R)
        with Locations((-118.0941, 40)):
            Circle(CROQUIS9_7_R)
    extrude(amount=-CORTAR_EXTRUIR7_DEPTH, mode=Mode.SUBTRACT)


solid = part.part
